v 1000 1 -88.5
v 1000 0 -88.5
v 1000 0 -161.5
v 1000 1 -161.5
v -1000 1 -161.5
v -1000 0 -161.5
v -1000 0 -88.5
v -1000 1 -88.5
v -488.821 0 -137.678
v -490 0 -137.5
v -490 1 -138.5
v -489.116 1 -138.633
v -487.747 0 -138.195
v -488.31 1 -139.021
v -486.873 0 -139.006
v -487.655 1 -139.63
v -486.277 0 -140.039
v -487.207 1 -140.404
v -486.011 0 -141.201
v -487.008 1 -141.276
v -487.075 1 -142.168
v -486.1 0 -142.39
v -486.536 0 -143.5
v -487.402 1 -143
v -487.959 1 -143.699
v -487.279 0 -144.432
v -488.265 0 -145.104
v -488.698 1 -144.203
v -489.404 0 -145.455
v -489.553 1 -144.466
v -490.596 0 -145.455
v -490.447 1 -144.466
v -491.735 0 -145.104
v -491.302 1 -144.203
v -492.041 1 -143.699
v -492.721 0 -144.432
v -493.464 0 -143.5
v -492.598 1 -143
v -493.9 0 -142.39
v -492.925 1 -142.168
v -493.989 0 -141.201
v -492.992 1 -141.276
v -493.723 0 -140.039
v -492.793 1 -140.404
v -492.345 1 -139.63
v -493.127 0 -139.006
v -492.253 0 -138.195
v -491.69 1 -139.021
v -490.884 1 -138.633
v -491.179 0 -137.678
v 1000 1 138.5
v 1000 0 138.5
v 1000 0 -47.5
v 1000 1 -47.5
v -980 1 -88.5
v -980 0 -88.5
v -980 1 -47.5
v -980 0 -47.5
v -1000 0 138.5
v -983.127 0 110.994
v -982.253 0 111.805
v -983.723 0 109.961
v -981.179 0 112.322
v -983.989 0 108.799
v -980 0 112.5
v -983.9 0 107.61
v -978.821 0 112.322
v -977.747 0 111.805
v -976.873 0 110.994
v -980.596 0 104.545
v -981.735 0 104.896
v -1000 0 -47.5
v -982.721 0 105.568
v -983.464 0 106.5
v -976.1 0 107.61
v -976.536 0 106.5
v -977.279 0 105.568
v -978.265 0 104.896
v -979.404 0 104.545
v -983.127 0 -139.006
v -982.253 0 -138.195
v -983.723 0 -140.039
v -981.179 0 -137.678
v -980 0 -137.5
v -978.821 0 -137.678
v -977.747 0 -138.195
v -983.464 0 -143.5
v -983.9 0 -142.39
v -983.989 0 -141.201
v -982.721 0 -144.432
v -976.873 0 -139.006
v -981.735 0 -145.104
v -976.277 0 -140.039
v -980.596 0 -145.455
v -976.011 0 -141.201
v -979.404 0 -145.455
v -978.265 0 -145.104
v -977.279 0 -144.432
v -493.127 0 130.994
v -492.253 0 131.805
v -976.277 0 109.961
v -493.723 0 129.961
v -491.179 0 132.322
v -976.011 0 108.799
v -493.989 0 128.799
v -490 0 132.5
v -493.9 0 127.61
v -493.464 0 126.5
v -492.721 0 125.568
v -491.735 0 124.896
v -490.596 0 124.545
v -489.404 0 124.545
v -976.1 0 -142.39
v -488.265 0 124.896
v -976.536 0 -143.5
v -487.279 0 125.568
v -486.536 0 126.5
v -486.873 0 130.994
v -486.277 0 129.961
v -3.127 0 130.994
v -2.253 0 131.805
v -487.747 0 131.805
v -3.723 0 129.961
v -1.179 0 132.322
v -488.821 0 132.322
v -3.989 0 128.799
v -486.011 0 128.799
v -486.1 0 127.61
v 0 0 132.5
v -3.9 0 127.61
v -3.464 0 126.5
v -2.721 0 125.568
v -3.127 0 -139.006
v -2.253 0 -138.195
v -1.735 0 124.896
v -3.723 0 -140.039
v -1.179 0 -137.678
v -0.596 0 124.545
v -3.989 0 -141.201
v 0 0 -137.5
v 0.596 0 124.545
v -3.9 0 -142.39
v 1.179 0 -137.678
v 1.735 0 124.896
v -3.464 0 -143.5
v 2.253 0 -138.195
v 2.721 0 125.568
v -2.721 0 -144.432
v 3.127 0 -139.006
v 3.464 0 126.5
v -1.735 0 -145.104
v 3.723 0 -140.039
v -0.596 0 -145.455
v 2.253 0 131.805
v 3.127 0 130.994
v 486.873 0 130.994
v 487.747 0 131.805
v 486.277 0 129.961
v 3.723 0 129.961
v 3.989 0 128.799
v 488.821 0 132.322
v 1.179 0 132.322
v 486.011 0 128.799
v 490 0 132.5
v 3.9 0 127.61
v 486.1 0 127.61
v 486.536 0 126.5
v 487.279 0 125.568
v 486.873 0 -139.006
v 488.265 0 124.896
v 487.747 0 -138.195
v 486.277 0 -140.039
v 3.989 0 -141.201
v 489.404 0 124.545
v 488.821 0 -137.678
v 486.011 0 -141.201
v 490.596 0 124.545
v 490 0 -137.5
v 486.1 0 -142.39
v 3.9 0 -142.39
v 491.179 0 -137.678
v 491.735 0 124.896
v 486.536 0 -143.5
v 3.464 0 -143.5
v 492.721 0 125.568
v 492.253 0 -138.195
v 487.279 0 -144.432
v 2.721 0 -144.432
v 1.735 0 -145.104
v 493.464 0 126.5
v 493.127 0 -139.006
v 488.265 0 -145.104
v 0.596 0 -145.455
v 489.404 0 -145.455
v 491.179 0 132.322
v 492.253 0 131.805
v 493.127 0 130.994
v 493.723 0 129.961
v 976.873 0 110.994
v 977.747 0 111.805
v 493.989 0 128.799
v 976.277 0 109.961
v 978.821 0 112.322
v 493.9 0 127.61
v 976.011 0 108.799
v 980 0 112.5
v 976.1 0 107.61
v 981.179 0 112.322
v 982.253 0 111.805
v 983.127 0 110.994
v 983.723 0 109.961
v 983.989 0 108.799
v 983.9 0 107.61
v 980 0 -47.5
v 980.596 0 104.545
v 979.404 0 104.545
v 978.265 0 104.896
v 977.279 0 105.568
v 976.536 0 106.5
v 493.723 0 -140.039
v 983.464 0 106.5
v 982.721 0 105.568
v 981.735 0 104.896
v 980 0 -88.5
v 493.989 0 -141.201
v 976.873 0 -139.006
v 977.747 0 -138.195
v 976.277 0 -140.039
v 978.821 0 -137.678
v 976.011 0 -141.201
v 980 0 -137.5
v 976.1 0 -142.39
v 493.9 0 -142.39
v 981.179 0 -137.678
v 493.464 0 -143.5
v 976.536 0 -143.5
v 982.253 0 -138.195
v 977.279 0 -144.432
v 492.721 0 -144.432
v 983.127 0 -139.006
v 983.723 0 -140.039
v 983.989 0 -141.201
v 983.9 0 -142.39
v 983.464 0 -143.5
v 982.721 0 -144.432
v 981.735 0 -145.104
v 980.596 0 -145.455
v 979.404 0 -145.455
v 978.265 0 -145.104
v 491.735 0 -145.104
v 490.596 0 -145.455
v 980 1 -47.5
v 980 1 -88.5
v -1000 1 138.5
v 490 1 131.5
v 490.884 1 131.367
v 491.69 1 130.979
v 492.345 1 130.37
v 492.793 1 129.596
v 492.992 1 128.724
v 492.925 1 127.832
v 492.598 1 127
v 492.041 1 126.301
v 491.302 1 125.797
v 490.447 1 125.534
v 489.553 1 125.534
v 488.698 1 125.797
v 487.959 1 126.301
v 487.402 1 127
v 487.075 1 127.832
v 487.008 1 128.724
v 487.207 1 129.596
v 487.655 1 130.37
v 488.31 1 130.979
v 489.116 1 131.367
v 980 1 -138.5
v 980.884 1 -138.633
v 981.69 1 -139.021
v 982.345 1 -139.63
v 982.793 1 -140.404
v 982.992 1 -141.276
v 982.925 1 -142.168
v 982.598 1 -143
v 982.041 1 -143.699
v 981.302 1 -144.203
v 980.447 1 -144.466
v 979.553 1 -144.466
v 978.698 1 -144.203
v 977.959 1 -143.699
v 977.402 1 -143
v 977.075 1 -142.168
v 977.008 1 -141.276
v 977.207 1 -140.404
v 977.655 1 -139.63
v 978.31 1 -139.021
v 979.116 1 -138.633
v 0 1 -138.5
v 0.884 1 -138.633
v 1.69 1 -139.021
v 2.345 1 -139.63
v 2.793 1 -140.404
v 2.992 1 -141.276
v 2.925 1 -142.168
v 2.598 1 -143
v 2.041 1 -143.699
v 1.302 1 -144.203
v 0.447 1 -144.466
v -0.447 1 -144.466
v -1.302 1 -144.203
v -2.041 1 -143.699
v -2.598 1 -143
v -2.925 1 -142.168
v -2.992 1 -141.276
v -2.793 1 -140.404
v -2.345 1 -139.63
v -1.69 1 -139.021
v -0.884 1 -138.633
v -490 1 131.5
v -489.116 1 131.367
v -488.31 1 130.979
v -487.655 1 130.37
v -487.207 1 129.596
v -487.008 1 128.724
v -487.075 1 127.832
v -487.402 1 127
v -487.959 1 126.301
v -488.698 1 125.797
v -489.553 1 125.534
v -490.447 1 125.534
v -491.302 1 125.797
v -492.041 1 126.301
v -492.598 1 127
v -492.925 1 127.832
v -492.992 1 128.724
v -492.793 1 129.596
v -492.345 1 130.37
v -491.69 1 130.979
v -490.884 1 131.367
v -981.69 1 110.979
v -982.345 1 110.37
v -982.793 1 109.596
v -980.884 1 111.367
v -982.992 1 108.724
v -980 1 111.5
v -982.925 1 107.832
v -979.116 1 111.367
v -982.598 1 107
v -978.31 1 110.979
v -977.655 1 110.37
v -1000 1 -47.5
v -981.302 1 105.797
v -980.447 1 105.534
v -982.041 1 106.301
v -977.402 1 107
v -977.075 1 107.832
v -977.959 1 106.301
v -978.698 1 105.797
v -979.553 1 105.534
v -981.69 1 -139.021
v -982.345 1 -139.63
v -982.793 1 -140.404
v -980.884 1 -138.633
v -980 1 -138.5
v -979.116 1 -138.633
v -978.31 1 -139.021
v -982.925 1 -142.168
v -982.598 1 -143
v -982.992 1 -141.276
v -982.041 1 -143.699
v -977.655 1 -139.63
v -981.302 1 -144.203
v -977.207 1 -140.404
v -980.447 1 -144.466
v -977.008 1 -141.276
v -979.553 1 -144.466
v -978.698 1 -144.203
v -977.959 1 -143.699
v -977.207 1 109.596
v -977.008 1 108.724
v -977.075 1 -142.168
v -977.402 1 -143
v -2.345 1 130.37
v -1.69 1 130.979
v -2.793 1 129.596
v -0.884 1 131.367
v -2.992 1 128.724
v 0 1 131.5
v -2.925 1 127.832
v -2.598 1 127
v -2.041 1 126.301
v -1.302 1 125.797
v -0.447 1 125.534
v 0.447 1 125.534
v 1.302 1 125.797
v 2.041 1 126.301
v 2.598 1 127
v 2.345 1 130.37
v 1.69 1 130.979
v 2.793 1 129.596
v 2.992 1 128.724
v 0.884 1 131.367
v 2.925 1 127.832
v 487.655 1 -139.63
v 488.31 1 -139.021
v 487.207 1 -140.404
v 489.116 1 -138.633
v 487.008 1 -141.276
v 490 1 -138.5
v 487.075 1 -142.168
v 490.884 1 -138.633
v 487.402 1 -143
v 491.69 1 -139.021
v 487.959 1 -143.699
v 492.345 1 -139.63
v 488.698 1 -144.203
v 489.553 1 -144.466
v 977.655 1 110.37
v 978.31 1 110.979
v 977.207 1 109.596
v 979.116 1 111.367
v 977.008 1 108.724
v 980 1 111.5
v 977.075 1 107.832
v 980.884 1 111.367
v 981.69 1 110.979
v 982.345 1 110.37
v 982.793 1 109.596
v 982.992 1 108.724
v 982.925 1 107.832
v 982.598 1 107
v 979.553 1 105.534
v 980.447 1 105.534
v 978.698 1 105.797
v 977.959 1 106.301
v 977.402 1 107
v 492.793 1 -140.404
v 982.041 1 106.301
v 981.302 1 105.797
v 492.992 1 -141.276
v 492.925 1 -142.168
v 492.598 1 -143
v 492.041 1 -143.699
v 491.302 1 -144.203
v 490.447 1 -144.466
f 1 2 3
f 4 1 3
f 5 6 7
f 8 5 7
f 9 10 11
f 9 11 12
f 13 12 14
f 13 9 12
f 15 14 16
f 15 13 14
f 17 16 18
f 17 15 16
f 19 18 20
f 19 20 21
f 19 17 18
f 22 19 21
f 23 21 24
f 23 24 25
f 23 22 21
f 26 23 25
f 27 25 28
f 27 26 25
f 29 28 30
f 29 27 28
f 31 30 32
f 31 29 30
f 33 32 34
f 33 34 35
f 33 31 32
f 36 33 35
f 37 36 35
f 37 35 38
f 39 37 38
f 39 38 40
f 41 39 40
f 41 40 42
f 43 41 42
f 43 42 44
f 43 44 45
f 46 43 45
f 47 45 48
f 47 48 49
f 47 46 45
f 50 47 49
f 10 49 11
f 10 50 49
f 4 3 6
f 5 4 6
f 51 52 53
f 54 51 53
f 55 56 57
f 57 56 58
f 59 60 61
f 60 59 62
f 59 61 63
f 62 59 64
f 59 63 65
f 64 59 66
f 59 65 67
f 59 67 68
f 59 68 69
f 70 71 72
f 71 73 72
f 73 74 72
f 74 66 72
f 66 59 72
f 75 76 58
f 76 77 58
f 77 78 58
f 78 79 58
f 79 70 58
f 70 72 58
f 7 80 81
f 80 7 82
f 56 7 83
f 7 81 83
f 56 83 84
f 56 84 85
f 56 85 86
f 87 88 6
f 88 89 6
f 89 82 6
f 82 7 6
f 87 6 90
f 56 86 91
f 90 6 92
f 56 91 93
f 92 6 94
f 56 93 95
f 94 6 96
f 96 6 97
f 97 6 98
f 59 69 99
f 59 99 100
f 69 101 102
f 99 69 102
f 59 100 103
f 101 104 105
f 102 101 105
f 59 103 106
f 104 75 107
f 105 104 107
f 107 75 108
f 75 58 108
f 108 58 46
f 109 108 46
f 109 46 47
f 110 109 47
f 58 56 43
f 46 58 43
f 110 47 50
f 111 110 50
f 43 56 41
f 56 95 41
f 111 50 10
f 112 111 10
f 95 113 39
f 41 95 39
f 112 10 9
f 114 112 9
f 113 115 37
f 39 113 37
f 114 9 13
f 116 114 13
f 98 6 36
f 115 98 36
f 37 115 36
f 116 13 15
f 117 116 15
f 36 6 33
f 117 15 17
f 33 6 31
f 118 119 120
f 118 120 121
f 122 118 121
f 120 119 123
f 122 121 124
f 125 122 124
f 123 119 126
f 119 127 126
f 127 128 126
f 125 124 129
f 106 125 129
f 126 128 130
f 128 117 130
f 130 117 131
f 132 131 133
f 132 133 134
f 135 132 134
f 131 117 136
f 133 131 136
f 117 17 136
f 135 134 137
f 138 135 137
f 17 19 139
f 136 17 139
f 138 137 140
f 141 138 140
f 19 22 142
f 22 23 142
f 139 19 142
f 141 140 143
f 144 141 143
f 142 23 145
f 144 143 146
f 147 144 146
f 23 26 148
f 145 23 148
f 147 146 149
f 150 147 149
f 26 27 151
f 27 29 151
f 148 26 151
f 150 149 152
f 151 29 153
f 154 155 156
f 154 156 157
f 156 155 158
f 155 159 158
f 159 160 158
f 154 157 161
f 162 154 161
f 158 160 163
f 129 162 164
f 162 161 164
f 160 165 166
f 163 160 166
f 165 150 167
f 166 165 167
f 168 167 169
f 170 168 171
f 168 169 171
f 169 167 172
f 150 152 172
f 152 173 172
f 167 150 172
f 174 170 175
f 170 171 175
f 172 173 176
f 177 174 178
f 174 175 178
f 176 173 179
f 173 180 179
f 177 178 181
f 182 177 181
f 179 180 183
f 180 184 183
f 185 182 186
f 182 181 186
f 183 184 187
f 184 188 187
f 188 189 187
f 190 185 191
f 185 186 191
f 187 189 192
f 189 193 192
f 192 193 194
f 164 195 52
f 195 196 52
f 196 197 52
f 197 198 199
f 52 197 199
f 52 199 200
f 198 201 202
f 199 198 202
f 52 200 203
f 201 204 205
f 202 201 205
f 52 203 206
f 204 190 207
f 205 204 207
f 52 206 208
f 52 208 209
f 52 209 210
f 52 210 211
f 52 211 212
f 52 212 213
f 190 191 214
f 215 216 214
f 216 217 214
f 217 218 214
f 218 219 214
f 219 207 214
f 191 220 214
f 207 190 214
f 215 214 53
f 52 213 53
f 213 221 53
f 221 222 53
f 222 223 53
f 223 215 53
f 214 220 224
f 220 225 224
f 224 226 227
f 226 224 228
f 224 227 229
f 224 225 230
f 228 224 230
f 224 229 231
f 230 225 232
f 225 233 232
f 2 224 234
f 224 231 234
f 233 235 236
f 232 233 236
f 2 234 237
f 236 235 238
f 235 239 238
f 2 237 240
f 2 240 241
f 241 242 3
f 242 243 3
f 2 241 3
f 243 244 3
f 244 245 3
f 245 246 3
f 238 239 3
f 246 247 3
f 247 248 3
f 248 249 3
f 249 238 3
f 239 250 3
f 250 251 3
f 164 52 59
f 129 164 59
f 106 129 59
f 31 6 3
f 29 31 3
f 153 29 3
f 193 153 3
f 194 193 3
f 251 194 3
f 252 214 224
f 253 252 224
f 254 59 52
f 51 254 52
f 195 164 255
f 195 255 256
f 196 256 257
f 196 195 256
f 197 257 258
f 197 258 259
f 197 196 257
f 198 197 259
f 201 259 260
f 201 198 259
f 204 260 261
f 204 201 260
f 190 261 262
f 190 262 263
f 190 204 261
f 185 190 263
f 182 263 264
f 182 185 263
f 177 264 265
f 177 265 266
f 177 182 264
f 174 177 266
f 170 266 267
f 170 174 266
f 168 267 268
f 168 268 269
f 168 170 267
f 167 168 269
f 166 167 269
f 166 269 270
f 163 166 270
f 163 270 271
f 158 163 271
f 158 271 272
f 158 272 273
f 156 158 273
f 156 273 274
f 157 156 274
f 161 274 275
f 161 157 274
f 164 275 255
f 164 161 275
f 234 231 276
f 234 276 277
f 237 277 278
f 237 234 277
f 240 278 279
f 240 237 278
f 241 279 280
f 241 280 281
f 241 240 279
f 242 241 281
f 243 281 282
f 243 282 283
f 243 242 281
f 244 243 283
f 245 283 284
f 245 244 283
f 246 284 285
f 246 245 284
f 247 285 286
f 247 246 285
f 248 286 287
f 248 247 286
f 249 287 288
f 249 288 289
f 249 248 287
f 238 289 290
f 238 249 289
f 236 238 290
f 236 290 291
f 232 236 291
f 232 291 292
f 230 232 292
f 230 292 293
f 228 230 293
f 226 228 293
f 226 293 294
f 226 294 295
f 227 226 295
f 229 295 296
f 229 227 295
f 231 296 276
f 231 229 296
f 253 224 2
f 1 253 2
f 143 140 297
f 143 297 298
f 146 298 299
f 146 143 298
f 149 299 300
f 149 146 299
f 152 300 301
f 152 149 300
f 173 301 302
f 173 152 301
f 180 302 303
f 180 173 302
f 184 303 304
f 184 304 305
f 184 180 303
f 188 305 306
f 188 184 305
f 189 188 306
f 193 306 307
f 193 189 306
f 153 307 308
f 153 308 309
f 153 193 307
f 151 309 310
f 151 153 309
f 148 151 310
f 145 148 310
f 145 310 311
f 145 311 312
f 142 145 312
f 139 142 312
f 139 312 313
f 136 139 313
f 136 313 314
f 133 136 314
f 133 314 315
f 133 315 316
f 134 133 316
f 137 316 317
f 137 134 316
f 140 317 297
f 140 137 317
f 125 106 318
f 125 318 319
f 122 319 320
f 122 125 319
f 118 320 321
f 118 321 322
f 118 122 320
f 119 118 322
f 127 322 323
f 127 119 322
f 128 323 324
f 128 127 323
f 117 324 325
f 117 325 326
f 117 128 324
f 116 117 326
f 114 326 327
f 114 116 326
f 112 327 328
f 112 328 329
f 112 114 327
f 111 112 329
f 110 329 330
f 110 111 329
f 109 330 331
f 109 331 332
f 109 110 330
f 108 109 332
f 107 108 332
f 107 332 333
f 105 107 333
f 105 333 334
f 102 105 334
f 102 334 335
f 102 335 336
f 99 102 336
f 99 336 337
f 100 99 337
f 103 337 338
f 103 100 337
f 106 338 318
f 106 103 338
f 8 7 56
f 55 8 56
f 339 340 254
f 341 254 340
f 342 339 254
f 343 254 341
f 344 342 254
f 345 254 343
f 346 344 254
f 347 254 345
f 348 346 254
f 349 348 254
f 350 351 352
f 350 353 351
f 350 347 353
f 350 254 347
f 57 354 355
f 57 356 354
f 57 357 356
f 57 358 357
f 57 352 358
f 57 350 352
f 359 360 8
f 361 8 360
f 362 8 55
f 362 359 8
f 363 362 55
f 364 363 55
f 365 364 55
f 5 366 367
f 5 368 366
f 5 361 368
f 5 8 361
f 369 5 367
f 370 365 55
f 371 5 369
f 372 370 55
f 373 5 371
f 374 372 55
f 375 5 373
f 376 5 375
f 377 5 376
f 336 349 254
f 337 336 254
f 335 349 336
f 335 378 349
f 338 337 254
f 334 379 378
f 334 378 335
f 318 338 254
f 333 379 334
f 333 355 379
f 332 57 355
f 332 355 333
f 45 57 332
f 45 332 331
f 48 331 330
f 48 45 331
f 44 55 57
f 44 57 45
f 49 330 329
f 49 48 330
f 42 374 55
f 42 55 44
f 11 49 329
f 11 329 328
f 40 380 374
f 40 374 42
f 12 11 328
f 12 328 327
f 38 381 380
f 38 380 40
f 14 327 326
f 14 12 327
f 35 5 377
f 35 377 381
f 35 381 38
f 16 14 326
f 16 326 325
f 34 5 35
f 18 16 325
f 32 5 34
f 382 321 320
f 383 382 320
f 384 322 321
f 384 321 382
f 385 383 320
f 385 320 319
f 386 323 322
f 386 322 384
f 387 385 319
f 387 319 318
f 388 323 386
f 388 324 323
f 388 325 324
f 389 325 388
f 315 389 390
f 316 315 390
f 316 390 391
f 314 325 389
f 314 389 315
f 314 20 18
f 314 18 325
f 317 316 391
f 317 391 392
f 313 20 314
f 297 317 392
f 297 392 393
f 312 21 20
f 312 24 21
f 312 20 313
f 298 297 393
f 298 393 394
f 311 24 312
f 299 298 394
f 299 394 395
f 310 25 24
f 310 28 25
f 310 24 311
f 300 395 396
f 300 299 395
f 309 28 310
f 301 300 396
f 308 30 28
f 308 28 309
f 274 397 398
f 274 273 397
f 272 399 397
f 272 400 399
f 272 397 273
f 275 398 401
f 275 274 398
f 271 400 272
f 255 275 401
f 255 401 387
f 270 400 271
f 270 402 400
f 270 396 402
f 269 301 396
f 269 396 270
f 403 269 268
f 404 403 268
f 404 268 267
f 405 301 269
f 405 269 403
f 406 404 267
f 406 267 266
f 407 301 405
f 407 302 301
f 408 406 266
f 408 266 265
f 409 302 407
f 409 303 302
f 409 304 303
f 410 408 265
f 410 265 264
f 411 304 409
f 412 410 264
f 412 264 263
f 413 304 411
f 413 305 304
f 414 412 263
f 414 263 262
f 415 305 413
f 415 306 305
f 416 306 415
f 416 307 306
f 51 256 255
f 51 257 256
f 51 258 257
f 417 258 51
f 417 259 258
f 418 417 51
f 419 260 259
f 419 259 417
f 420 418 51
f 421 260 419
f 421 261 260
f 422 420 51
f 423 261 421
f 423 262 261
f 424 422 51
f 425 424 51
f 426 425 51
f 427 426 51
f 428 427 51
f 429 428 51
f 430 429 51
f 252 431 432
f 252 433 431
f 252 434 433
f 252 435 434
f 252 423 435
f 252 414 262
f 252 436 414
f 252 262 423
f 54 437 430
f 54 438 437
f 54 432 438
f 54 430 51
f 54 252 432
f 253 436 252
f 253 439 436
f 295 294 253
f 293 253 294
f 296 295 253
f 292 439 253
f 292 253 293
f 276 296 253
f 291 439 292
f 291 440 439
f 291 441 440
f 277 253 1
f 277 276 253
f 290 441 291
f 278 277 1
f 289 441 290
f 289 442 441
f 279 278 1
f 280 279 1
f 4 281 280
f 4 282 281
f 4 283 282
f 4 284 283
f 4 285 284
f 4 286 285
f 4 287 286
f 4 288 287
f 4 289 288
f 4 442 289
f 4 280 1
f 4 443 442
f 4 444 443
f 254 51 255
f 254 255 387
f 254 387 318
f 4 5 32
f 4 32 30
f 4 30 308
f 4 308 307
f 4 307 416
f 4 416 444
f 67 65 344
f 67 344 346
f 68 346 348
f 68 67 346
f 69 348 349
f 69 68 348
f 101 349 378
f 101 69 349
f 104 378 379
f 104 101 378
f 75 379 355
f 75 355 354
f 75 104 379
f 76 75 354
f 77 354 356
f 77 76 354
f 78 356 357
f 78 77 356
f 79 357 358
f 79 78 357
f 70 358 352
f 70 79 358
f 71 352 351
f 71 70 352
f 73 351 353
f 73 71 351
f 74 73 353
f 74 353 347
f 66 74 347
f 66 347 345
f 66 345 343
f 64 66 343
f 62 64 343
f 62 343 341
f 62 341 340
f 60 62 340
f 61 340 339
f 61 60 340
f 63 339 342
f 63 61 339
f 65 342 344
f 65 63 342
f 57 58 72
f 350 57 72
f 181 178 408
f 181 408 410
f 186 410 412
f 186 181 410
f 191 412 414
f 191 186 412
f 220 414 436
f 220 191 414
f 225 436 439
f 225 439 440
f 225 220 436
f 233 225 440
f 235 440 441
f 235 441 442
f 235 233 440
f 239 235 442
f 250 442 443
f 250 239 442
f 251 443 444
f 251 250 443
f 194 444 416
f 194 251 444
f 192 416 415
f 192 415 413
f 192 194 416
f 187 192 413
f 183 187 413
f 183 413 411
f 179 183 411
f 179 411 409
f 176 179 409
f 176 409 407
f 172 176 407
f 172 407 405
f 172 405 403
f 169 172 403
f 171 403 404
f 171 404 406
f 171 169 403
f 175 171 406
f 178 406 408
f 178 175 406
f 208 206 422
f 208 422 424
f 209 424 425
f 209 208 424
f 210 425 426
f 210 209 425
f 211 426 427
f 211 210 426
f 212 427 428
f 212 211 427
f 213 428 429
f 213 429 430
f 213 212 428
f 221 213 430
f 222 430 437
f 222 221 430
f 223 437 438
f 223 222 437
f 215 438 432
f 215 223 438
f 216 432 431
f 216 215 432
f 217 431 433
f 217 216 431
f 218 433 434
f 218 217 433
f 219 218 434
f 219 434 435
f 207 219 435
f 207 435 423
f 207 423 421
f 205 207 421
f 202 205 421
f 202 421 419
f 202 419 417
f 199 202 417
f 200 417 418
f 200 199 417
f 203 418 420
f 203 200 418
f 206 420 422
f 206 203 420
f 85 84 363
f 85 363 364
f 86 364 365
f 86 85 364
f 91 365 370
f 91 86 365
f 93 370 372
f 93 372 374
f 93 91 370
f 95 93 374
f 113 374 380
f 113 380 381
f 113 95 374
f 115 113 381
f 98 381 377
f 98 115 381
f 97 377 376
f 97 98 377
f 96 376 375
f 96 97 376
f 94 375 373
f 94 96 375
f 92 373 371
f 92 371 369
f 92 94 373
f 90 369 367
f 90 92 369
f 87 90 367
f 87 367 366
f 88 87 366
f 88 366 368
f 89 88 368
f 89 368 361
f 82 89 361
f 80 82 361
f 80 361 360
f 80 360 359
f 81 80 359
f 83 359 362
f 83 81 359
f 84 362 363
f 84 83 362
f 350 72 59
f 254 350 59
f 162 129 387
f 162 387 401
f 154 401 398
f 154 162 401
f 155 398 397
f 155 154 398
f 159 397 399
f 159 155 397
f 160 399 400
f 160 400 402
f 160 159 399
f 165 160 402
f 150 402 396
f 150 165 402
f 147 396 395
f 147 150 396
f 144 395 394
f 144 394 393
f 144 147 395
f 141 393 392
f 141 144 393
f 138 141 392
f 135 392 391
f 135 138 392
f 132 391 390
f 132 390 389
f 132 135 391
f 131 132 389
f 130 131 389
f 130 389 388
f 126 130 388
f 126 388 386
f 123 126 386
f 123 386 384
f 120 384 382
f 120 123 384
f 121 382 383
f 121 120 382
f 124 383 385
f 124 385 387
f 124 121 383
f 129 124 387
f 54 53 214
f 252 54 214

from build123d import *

# Parameters (mm, degrees)
SKETCH1_R           = 3
BOSS_EXTRUDE1_DEPTH = 1
CHAMFER1_SIZE       = 1


with BuildPart() as part:
    # Sketch1 → Boss-Extrude1 (new body)
    with BuildSketch(Plane(origin=(0, 0, 0), x_dir=(1, 0, 0), z_dir=(0, 1, 0))):
        Polygon((-1000, 88.5), (-980, 88.5), (-980, 47.5), (-1000, 47.5), (-1000, -138.5), (1000, -138.5), (1000, 47.5), (980, 47.5), (980, 88.5), (1000, 88.5), (1000, 158.5), (1000, 161.5), (-1000, 161.5), (-1000, 158.5), align=None)
        with Locations(Location((-980, 141.5, 0), (0, 0, 270))):
            Circle(SKETCH1_R, mode=Mode.SUBTRACT)
        with Locations(Location((980, 141.5, 0), (0, 0, 270))):
            Circle(SKETCH1_R, mode=Mode.SUBTRACT)
        with Locations(Location((0, 141.5, 0), (0, 0, 270))):
            Circle(SKETCH1_R, mode=Mode.SUBTRACT)
        with Locations(Location((490, 141.5, 0), (0, 0, 270))):
            Circle(SKETCH1_R, mode=Mode.SUBTRACT)
        with Locations(Location((-490, 141.5, 0), (0, 0, 270))):
            Circle(SKETCH1_R, mode=Mode.SUBTRACT)
        with Locations(Location((490, -128.5, 0), (0, 0, 270))):
            Circle(SKETCH1_R, mode=Mode.SUBTRACT)
        with Locations(Location((980, -108.5, 0), (0, 0, 270))):
            Circle(SKETCH1_R, mode=Mode.SUBTRACT)
        with Locations(Location((0, -128.5, 0), (0, 0, 270))):
            Circle(SKETCH1_R, mode=Mode.SUBTRACT)
        with Locations(Location((-490, -128.5, 0), (0, 0, 270))):
            Circle(SKETCH1_R, mode=Mode.SUBTRACT)
        with Locations(Location((-980, -108.5, 0), (0, 0, 270))):
            Circle(SKETCH1_R, mode=Mode.SUBTRACT)
    extrude(amount=BOSS_EXTRUDE1_DEPTH)

    # Chamfer1
    chamfer1_edges = [part.edges().sort_by_distance(p)[0] for p in [
        (-980, 0, -144.5),
        (980, 0, -144.5),
        (0, 0, -144.5),
        (490, 0, -144.5),
        (-490, 0, -144.5),
        (490, 0, 125.5),
        (980, 0, 105.5),
        (0, 0, 125.5),
        (-490, 0, 125.5),
        (-980, 0, 105.5),
    ]]
    chamfer(chamfer1_edges, length=CHAMFER1_SIZE - 0.0001)  # a hair under: the kernel refuses the full size


solid = part.part
